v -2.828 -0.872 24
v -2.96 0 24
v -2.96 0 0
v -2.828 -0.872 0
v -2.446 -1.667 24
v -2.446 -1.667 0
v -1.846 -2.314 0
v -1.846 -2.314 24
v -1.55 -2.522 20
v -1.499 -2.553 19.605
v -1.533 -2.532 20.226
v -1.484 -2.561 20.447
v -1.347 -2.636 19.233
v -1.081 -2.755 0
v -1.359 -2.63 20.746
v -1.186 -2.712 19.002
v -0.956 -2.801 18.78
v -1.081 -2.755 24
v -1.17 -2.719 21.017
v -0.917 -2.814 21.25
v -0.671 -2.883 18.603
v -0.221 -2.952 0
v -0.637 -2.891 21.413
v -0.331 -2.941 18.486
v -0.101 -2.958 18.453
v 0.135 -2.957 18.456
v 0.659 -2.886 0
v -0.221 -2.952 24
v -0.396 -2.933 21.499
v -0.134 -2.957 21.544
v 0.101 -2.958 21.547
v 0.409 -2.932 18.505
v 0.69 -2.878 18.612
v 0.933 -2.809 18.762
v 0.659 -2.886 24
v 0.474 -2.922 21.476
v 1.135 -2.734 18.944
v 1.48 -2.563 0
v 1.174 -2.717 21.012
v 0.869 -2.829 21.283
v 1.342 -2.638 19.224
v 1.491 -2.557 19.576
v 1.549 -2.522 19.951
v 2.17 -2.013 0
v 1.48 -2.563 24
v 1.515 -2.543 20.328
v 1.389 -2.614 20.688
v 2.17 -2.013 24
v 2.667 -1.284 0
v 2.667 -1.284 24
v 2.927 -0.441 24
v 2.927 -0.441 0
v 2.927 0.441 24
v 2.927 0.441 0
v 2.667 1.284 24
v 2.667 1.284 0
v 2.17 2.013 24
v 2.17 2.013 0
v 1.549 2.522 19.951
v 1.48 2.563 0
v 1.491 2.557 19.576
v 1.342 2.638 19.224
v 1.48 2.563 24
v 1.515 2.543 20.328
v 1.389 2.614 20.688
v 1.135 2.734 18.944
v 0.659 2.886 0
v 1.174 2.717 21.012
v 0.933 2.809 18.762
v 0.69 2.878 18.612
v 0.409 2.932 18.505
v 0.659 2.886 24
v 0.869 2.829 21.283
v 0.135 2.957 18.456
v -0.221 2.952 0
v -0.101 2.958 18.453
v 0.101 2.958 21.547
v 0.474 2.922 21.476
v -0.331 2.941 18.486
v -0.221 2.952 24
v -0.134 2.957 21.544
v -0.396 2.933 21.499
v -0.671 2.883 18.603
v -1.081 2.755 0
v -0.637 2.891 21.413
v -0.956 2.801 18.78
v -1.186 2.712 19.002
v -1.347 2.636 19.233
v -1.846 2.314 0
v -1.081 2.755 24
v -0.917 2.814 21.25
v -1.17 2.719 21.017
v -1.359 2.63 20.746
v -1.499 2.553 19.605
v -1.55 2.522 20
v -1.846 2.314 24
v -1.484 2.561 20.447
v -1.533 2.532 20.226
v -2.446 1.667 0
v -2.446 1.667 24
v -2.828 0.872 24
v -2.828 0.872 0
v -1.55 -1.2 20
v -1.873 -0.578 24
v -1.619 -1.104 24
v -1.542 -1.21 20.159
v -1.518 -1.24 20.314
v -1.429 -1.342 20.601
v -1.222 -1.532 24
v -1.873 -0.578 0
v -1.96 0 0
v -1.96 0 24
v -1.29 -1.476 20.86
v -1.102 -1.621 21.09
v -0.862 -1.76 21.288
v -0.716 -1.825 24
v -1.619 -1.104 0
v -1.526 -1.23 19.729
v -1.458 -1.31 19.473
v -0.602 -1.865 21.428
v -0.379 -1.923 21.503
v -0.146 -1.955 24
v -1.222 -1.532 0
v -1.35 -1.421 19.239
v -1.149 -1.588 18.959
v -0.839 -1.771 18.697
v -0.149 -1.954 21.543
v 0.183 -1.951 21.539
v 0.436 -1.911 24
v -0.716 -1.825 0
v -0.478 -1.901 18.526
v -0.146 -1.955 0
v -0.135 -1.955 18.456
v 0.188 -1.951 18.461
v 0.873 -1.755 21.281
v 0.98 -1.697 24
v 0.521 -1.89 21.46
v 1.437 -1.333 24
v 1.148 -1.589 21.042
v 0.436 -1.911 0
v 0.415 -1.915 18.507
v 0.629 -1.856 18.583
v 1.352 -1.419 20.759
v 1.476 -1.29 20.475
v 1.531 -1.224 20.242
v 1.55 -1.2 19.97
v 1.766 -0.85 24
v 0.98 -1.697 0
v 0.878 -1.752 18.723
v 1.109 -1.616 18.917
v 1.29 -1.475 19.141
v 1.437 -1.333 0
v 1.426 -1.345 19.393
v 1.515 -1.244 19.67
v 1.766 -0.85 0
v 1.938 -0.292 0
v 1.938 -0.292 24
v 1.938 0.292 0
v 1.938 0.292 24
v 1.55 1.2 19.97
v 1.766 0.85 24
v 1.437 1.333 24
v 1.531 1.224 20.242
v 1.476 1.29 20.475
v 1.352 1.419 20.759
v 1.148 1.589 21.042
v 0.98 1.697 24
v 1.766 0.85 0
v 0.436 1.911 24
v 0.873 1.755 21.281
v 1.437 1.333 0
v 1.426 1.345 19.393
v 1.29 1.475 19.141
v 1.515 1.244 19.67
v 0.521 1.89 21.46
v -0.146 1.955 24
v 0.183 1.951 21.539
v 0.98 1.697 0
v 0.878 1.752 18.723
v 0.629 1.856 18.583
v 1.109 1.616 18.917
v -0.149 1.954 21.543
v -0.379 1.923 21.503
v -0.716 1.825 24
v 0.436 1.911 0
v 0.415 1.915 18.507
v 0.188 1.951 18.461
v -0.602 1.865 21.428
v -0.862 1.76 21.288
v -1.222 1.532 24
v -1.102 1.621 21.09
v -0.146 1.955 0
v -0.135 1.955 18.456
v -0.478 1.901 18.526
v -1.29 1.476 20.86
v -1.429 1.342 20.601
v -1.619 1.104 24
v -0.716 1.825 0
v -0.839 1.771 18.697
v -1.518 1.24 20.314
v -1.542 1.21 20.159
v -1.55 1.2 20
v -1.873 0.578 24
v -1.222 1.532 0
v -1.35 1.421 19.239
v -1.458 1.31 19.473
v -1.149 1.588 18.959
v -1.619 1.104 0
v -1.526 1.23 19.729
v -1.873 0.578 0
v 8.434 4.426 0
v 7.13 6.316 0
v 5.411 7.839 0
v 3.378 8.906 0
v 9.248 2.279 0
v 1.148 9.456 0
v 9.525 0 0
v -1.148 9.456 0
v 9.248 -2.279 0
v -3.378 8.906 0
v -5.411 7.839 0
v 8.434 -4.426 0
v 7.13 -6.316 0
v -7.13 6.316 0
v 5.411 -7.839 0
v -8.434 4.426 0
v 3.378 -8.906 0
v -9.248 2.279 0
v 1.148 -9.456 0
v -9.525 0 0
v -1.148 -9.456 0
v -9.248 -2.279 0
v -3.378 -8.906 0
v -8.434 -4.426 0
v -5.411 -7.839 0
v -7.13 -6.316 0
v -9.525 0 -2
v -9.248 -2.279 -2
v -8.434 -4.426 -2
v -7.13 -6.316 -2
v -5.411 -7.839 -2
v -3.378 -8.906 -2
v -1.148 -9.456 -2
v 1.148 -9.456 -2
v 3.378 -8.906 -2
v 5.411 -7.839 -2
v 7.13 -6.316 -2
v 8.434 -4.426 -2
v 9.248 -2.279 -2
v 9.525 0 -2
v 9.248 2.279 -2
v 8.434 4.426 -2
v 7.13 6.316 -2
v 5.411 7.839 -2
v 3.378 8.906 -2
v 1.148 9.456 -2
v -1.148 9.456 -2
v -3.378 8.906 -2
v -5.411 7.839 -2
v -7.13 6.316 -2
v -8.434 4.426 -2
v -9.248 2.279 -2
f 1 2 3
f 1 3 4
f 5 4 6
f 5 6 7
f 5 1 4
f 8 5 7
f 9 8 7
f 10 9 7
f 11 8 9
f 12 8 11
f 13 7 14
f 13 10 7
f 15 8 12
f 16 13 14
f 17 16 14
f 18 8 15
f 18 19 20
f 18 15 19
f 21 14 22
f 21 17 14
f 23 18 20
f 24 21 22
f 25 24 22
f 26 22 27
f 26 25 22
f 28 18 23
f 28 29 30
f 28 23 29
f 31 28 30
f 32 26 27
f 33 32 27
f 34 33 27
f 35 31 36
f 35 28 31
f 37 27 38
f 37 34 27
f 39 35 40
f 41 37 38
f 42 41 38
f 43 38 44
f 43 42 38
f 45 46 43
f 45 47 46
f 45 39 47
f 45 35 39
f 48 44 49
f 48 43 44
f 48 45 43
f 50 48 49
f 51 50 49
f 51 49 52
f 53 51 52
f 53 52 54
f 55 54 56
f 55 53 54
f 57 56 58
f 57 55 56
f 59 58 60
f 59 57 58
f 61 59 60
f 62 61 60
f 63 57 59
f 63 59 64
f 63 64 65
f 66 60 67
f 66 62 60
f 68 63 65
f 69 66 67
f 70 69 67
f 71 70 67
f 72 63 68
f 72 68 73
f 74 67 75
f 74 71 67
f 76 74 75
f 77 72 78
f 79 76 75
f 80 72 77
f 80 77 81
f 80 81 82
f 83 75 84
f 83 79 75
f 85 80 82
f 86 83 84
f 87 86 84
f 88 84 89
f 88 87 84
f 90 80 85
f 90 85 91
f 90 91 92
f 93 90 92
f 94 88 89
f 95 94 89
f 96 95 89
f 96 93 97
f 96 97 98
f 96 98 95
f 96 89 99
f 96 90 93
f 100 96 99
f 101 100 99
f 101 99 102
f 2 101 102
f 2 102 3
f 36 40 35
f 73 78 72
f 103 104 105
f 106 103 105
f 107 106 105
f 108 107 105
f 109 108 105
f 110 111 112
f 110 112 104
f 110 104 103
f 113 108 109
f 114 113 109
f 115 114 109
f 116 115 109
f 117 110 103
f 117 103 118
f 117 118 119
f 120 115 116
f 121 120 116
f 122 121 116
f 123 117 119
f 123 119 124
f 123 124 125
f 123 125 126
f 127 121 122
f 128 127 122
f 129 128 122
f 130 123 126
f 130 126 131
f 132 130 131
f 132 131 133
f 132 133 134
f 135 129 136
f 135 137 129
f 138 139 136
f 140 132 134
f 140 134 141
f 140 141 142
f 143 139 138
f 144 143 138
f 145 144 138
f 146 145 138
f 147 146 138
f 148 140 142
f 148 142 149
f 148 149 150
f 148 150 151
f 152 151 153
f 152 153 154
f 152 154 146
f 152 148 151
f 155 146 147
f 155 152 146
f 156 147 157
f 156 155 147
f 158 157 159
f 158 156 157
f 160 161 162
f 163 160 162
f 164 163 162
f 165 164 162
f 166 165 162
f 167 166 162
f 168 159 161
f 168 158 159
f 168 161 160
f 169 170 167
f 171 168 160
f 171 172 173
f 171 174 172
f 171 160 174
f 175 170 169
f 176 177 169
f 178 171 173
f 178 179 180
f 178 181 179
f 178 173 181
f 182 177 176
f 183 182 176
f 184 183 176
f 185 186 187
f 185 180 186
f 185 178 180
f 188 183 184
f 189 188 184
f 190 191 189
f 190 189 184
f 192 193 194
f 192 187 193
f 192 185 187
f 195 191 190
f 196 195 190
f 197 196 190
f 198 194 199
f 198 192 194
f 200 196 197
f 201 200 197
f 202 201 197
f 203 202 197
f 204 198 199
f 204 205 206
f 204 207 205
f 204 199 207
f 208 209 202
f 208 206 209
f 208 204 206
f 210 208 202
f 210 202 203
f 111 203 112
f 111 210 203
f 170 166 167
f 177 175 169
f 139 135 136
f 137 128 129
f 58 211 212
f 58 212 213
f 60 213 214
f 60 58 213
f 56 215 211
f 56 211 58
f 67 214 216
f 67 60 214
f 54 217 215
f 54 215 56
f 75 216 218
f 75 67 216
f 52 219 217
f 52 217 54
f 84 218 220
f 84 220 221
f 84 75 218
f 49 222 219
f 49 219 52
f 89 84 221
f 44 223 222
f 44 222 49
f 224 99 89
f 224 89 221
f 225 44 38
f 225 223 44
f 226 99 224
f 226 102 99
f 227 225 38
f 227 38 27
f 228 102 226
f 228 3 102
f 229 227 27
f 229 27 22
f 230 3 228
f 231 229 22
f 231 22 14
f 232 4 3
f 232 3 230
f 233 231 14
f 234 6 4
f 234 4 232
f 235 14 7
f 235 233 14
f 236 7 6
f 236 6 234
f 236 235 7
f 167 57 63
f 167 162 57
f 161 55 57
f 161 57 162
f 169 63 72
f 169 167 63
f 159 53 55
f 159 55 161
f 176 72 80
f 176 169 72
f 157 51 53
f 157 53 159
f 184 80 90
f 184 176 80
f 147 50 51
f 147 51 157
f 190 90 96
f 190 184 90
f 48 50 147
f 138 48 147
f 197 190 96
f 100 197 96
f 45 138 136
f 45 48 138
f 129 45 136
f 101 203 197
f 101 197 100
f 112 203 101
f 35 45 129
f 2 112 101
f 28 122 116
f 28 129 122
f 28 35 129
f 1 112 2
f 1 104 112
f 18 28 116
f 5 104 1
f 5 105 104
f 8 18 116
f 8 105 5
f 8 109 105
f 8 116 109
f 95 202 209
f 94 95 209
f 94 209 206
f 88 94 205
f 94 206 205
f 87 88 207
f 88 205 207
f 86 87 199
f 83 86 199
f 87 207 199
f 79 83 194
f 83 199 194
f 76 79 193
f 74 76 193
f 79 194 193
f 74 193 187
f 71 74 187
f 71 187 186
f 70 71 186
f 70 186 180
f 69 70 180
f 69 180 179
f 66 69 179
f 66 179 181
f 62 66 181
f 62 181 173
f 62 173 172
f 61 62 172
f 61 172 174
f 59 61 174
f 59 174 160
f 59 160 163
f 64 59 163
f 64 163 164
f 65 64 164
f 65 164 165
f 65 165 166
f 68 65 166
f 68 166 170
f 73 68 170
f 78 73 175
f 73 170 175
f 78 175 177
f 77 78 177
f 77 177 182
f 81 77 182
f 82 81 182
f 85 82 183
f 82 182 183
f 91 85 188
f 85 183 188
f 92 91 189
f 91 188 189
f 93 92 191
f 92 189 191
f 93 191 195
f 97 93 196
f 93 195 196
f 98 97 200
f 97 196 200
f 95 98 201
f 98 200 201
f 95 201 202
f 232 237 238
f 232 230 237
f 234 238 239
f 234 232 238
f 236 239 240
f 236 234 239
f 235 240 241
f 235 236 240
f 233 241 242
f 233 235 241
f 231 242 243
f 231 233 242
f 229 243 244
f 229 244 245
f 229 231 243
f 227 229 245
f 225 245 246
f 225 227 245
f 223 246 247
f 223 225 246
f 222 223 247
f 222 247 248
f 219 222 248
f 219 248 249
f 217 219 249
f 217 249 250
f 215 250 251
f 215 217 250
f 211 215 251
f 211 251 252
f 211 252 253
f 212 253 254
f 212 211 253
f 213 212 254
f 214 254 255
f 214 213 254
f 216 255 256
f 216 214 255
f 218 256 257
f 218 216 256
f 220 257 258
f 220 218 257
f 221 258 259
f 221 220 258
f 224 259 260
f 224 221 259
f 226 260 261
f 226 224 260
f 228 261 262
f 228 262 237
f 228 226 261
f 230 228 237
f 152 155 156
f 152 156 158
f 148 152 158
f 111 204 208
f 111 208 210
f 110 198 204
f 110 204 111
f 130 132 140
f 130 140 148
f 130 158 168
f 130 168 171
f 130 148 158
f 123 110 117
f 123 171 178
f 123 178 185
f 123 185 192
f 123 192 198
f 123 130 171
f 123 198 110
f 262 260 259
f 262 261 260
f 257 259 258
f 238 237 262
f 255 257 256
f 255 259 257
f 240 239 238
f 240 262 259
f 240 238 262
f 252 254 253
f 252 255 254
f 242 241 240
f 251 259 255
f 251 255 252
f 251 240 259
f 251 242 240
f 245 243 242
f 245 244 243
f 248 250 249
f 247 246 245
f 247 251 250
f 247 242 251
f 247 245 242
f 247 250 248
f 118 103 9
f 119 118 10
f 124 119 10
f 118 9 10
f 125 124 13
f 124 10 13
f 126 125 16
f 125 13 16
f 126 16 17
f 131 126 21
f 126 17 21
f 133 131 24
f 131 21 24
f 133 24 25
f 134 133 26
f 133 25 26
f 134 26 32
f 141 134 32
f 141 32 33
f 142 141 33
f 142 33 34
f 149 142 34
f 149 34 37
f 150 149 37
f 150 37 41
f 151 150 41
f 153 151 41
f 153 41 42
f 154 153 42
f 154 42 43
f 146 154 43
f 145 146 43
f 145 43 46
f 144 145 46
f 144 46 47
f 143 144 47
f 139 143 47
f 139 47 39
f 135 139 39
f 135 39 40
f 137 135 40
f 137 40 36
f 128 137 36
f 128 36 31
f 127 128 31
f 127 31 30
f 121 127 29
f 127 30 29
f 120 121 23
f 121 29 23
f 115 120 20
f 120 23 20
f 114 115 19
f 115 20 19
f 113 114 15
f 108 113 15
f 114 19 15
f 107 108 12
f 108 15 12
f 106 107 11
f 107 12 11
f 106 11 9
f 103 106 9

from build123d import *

# Parameters (mm, degrees)
M2_5_CLEARANCE_HOLE1_D = 3.1


with BuildPart() as part:
    # Sketch1 → Revolve1 (revolve)
    with BuildSketch(Plane(origin=(0, 0, 0), x_dir=(1, 0, 0), z_dir=(0, 1, 0)), mode=Mode.PRIVATE) as revolve1_sk:
        Polygon((1.96, -24), (1.96, 0), (0, 0), (0, 2), (9.525, 2), (9.525, 0), (2.96, 0), (2.96, -24), align=None)
    revolve(revolve1_sk.sketch.rotate(Axis((0, 0, -2), (0, 0, 1)), 180), axis=Axis((0, 0, -2), (0, 0, 1)))

    # M2.5 Clearance Hole1 (through all)
    with Locations(Plane(origin=(0, 2.96, 0), x_dir=(1, 0, 0), z_dir=(0, 1, 0))):
        with Locations((0, -20)):
            Hole(M2_5_CLEARANCE_HOLE1_D / 2)


solid = part.part
